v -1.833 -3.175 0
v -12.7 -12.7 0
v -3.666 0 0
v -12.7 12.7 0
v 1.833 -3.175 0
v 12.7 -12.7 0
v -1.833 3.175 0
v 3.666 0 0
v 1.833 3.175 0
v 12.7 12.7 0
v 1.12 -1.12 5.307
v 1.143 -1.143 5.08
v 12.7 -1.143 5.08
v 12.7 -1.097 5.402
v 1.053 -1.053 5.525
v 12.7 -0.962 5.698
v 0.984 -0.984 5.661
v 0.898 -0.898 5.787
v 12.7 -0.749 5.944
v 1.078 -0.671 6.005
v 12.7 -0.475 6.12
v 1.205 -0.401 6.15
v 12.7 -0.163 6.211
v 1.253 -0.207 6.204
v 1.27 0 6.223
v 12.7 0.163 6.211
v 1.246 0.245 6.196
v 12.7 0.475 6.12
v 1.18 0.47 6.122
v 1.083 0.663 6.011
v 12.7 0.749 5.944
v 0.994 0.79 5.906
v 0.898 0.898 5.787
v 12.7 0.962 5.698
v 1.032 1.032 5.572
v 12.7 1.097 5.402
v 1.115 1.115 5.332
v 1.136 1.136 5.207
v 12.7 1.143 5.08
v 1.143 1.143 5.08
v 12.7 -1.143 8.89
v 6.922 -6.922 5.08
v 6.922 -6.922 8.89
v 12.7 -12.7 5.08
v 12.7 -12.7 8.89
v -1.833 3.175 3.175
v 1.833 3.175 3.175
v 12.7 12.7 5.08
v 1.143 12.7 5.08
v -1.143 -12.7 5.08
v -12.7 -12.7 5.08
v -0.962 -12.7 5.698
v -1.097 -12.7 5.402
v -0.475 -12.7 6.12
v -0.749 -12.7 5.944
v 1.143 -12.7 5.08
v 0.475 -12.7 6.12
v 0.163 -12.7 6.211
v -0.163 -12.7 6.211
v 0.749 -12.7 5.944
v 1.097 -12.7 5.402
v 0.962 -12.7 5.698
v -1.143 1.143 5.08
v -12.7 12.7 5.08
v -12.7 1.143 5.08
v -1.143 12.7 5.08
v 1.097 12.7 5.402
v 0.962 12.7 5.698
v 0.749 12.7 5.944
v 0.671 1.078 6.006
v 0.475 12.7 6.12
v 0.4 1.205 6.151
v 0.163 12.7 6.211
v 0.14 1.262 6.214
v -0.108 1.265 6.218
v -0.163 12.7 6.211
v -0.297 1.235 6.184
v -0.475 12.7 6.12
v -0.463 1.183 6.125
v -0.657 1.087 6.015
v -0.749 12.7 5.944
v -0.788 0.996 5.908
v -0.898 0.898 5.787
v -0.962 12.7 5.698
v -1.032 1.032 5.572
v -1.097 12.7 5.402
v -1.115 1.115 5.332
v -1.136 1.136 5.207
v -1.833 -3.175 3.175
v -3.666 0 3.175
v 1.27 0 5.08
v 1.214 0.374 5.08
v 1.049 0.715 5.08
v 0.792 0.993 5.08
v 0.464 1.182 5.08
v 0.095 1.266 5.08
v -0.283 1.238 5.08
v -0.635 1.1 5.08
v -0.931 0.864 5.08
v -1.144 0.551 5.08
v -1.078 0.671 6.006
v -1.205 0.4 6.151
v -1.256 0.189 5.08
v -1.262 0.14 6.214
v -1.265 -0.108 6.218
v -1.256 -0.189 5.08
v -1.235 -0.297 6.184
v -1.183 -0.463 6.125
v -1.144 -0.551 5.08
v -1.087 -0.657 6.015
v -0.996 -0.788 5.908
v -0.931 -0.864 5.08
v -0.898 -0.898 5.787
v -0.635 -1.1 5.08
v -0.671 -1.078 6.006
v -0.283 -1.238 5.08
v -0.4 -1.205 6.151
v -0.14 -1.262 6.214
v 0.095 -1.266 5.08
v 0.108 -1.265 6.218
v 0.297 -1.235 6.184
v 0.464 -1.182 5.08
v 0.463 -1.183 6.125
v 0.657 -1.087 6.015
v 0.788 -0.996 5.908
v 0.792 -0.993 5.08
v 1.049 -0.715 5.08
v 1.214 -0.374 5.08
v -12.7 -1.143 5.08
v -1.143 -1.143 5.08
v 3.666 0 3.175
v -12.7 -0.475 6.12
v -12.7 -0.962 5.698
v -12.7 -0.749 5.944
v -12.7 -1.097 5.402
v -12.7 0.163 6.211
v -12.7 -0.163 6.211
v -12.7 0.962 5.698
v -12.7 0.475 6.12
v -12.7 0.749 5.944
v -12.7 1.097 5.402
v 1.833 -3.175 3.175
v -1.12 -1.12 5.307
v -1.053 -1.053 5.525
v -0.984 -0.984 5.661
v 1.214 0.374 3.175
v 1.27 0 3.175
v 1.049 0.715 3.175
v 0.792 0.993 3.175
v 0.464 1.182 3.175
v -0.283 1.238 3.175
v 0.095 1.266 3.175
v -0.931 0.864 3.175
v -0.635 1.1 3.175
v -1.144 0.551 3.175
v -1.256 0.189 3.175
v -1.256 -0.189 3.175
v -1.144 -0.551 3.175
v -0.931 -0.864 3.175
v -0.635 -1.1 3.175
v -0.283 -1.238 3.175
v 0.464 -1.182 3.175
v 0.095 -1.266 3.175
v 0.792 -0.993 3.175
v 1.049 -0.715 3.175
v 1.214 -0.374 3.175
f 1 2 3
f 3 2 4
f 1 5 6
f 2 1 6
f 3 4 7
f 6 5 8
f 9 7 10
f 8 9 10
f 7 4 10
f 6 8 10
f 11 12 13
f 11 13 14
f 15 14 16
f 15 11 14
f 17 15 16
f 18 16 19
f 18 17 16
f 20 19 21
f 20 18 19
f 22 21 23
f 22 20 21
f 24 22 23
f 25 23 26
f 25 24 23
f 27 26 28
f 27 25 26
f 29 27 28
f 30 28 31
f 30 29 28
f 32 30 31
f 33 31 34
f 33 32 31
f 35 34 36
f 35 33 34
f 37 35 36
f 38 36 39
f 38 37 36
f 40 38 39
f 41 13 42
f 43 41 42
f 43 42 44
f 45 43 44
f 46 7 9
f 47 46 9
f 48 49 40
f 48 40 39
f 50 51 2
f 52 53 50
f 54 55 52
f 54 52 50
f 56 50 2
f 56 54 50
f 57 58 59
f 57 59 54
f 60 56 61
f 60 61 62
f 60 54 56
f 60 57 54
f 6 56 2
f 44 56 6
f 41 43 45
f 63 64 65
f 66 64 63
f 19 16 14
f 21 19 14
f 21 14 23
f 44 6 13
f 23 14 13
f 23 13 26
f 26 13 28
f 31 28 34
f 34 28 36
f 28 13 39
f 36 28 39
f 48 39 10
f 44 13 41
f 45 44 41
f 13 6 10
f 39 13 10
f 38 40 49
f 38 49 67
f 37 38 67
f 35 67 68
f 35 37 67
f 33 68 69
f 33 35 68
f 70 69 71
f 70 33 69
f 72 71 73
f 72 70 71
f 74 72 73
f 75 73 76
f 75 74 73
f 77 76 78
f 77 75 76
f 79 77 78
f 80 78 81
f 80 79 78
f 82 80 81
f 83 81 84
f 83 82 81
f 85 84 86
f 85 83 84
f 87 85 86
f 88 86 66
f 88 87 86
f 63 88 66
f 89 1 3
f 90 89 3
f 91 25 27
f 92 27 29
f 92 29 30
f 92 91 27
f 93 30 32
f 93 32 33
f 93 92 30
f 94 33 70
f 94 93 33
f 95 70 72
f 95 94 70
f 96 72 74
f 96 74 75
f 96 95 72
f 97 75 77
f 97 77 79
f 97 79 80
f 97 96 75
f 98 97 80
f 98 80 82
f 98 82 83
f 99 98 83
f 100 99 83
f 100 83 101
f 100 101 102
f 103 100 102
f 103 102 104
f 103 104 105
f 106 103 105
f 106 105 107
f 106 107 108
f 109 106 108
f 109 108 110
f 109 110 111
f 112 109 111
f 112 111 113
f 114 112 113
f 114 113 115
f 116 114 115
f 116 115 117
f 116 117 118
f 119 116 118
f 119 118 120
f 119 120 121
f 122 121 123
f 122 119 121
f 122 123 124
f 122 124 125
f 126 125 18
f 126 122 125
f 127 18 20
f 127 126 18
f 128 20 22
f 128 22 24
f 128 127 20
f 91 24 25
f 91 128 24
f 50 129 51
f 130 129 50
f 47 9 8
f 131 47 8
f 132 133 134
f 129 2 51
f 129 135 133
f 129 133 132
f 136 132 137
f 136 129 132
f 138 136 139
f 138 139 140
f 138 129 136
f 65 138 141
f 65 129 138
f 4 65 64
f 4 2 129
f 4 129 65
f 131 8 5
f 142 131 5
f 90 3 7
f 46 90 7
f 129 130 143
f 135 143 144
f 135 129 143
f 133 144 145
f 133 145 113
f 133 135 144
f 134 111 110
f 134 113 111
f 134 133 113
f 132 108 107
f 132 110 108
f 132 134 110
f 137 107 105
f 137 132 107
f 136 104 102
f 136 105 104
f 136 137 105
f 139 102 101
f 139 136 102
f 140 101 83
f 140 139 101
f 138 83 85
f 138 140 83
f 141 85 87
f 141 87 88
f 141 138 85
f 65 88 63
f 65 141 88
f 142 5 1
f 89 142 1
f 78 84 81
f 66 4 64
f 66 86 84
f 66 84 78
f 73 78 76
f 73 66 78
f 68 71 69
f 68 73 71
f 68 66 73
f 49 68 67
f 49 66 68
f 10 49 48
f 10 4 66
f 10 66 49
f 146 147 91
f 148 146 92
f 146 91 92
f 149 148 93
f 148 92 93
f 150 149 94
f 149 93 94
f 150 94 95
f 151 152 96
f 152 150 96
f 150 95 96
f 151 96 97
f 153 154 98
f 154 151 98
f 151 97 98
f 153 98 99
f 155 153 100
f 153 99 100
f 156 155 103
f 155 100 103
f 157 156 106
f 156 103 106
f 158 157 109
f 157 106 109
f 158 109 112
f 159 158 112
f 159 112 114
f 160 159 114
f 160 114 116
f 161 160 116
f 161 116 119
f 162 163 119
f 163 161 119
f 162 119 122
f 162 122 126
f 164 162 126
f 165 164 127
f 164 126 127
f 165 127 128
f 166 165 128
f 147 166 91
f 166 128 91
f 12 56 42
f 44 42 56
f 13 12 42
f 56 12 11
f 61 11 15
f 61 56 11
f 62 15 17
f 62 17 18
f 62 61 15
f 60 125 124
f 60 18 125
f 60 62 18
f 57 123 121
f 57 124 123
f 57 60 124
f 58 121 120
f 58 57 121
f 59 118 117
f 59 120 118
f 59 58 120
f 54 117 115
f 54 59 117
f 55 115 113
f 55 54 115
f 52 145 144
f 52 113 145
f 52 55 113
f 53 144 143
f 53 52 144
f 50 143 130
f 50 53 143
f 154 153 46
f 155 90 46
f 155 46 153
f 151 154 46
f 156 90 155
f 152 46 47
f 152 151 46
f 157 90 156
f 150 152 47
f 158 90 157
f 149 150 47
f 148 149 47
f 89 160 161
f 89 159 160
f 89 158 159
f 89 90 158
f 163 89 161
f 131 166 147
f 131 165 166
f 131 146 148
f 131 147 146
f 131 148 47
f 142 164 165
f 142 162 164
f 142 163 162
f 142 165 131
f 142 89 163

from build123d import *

# Parameters (mm, degrees)
F0_W          = 25.4
F0_H          = 25.4
F1_DEPTH      = 5.08
F3_DEPTH      = 25.4
F5_DEPTH      = 25.4
F6_R          = 1.27
F7_DEPTH      = 25.4
F7_DEPTH_BACK = 25.4
F9_DEPTH      = 3.81
F10_R         = 1.27
F11_DEPTH     = 3.175


with BuildPart() as f1:
    # F0 (on Top) → F1 (new body)
    with BuildSketch(Plane.XY):
        Rectangle(F0_W, F0_H)
    extrude(amount=F1_DEPTH)

    # F2 (on face) → F3 (join)
    with BuildSketch(Plane(origin=(-12.7, 0, 0), x_dir=(0, -1, 0), z_dir=(-1, 0, 0))):
        with BuildLine():
            Line((-1.143, 5.08), (1.143, 5.08))
            ThreePointArc((1.143, 5.08), (0, 6.223), (-1.143, 5.08))
        make_face()
    extrude(amount=-F3_DEPTH)

    # F4 (on face) → F5 (join)
    with BuildSketch(Plane.XZ.offset(12.7)):
        with BuildLine():
            Line((-1.143, 5.08), (1.143, 5.08))
            ThreePointArc((1.143, 5.08), (0, 6.223), (-1.143, 5.08))
        make_face()
    extrude(amount=-F5_DEPTH)

    # F6 (on face) → F7 (cut, two sides)
    with BuildSketch(Plane.XY.offset(5.08)) as f7_sk:
        Circle(F6_R)
    extrude(amount=-F7_DEPTH, mode=Mode.SUBTRACT)
    extrude(f7_sk.sketch, amount=F7_DEPTH_BACK, mode=Mode.SUBTRACT)

    # F8 (on face) → F9 (join)
    with BuildSketch(Plane.XY.offset(5.08)):
        Polygon((12.7, -1.143), (6.9215, -6.9215), (12.7, -12.7), align=None)
    extrude(amount=F9_DEPTH)

    # F10 (on face) → F11 (cut)
    with BuildSketch(Plane(origin=(0, 0, 0), x_dir=(1, 0, 0), z_dir=(0, 0, -1))):
        Polygon((-1.8330871047, -3.175), (1.8330871047, -3.175), (3.6661742094, 0), (1.8330871047, 3.175), (-1.8330871047, 3.175), (-3.6661742094, 0), align=None)
        Circle(F10_R, mode=Mode.SUBTRACT)
    extrude(amount=-F11_DEPTH, mode=Mode.SUBTRACT)


solid = f1.part
